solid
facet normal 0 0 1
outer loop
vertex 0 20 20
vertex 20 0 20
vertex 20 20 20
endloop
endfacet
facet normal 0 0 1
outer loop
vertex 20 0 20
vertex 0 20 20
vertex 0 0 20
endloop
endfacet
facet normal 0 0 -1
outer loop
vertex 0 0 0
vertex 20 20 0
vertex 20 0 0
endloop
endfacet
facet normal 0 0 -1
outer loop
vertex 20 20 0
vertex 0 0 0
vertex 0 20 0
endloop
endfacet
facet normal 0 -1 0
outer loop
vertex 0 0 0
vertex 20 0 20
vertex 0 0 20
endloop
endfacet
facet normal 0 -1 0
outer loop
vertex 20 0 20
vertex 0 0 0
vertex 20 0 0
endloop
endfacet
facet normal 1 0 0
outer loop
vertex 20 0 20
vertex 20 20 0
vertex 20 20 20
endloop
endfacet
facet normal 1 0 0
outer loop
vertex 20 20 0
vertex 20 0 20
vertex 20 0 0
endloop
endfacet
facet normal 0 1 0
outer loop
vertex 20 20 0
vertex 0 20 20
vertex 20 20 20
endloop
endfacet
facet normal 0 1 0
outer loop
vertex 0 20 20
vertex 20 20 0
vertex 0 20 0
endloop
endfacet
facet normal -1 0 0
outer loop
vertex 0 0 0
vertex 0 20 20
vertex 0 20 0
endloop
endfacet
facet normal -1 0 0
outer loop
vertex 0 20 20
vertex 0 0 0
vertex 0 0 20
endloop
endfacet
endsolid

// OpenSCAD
/*
 * Minecraft desk game block
 * (c) 2020 David Mikulik
 * Licensed under 
 *   Creative Commons 
 *   Attribution Non Comercial Share alike license
 */
 SIZE=20;
 cube ([SIZE,SIZE, SIZE]);
